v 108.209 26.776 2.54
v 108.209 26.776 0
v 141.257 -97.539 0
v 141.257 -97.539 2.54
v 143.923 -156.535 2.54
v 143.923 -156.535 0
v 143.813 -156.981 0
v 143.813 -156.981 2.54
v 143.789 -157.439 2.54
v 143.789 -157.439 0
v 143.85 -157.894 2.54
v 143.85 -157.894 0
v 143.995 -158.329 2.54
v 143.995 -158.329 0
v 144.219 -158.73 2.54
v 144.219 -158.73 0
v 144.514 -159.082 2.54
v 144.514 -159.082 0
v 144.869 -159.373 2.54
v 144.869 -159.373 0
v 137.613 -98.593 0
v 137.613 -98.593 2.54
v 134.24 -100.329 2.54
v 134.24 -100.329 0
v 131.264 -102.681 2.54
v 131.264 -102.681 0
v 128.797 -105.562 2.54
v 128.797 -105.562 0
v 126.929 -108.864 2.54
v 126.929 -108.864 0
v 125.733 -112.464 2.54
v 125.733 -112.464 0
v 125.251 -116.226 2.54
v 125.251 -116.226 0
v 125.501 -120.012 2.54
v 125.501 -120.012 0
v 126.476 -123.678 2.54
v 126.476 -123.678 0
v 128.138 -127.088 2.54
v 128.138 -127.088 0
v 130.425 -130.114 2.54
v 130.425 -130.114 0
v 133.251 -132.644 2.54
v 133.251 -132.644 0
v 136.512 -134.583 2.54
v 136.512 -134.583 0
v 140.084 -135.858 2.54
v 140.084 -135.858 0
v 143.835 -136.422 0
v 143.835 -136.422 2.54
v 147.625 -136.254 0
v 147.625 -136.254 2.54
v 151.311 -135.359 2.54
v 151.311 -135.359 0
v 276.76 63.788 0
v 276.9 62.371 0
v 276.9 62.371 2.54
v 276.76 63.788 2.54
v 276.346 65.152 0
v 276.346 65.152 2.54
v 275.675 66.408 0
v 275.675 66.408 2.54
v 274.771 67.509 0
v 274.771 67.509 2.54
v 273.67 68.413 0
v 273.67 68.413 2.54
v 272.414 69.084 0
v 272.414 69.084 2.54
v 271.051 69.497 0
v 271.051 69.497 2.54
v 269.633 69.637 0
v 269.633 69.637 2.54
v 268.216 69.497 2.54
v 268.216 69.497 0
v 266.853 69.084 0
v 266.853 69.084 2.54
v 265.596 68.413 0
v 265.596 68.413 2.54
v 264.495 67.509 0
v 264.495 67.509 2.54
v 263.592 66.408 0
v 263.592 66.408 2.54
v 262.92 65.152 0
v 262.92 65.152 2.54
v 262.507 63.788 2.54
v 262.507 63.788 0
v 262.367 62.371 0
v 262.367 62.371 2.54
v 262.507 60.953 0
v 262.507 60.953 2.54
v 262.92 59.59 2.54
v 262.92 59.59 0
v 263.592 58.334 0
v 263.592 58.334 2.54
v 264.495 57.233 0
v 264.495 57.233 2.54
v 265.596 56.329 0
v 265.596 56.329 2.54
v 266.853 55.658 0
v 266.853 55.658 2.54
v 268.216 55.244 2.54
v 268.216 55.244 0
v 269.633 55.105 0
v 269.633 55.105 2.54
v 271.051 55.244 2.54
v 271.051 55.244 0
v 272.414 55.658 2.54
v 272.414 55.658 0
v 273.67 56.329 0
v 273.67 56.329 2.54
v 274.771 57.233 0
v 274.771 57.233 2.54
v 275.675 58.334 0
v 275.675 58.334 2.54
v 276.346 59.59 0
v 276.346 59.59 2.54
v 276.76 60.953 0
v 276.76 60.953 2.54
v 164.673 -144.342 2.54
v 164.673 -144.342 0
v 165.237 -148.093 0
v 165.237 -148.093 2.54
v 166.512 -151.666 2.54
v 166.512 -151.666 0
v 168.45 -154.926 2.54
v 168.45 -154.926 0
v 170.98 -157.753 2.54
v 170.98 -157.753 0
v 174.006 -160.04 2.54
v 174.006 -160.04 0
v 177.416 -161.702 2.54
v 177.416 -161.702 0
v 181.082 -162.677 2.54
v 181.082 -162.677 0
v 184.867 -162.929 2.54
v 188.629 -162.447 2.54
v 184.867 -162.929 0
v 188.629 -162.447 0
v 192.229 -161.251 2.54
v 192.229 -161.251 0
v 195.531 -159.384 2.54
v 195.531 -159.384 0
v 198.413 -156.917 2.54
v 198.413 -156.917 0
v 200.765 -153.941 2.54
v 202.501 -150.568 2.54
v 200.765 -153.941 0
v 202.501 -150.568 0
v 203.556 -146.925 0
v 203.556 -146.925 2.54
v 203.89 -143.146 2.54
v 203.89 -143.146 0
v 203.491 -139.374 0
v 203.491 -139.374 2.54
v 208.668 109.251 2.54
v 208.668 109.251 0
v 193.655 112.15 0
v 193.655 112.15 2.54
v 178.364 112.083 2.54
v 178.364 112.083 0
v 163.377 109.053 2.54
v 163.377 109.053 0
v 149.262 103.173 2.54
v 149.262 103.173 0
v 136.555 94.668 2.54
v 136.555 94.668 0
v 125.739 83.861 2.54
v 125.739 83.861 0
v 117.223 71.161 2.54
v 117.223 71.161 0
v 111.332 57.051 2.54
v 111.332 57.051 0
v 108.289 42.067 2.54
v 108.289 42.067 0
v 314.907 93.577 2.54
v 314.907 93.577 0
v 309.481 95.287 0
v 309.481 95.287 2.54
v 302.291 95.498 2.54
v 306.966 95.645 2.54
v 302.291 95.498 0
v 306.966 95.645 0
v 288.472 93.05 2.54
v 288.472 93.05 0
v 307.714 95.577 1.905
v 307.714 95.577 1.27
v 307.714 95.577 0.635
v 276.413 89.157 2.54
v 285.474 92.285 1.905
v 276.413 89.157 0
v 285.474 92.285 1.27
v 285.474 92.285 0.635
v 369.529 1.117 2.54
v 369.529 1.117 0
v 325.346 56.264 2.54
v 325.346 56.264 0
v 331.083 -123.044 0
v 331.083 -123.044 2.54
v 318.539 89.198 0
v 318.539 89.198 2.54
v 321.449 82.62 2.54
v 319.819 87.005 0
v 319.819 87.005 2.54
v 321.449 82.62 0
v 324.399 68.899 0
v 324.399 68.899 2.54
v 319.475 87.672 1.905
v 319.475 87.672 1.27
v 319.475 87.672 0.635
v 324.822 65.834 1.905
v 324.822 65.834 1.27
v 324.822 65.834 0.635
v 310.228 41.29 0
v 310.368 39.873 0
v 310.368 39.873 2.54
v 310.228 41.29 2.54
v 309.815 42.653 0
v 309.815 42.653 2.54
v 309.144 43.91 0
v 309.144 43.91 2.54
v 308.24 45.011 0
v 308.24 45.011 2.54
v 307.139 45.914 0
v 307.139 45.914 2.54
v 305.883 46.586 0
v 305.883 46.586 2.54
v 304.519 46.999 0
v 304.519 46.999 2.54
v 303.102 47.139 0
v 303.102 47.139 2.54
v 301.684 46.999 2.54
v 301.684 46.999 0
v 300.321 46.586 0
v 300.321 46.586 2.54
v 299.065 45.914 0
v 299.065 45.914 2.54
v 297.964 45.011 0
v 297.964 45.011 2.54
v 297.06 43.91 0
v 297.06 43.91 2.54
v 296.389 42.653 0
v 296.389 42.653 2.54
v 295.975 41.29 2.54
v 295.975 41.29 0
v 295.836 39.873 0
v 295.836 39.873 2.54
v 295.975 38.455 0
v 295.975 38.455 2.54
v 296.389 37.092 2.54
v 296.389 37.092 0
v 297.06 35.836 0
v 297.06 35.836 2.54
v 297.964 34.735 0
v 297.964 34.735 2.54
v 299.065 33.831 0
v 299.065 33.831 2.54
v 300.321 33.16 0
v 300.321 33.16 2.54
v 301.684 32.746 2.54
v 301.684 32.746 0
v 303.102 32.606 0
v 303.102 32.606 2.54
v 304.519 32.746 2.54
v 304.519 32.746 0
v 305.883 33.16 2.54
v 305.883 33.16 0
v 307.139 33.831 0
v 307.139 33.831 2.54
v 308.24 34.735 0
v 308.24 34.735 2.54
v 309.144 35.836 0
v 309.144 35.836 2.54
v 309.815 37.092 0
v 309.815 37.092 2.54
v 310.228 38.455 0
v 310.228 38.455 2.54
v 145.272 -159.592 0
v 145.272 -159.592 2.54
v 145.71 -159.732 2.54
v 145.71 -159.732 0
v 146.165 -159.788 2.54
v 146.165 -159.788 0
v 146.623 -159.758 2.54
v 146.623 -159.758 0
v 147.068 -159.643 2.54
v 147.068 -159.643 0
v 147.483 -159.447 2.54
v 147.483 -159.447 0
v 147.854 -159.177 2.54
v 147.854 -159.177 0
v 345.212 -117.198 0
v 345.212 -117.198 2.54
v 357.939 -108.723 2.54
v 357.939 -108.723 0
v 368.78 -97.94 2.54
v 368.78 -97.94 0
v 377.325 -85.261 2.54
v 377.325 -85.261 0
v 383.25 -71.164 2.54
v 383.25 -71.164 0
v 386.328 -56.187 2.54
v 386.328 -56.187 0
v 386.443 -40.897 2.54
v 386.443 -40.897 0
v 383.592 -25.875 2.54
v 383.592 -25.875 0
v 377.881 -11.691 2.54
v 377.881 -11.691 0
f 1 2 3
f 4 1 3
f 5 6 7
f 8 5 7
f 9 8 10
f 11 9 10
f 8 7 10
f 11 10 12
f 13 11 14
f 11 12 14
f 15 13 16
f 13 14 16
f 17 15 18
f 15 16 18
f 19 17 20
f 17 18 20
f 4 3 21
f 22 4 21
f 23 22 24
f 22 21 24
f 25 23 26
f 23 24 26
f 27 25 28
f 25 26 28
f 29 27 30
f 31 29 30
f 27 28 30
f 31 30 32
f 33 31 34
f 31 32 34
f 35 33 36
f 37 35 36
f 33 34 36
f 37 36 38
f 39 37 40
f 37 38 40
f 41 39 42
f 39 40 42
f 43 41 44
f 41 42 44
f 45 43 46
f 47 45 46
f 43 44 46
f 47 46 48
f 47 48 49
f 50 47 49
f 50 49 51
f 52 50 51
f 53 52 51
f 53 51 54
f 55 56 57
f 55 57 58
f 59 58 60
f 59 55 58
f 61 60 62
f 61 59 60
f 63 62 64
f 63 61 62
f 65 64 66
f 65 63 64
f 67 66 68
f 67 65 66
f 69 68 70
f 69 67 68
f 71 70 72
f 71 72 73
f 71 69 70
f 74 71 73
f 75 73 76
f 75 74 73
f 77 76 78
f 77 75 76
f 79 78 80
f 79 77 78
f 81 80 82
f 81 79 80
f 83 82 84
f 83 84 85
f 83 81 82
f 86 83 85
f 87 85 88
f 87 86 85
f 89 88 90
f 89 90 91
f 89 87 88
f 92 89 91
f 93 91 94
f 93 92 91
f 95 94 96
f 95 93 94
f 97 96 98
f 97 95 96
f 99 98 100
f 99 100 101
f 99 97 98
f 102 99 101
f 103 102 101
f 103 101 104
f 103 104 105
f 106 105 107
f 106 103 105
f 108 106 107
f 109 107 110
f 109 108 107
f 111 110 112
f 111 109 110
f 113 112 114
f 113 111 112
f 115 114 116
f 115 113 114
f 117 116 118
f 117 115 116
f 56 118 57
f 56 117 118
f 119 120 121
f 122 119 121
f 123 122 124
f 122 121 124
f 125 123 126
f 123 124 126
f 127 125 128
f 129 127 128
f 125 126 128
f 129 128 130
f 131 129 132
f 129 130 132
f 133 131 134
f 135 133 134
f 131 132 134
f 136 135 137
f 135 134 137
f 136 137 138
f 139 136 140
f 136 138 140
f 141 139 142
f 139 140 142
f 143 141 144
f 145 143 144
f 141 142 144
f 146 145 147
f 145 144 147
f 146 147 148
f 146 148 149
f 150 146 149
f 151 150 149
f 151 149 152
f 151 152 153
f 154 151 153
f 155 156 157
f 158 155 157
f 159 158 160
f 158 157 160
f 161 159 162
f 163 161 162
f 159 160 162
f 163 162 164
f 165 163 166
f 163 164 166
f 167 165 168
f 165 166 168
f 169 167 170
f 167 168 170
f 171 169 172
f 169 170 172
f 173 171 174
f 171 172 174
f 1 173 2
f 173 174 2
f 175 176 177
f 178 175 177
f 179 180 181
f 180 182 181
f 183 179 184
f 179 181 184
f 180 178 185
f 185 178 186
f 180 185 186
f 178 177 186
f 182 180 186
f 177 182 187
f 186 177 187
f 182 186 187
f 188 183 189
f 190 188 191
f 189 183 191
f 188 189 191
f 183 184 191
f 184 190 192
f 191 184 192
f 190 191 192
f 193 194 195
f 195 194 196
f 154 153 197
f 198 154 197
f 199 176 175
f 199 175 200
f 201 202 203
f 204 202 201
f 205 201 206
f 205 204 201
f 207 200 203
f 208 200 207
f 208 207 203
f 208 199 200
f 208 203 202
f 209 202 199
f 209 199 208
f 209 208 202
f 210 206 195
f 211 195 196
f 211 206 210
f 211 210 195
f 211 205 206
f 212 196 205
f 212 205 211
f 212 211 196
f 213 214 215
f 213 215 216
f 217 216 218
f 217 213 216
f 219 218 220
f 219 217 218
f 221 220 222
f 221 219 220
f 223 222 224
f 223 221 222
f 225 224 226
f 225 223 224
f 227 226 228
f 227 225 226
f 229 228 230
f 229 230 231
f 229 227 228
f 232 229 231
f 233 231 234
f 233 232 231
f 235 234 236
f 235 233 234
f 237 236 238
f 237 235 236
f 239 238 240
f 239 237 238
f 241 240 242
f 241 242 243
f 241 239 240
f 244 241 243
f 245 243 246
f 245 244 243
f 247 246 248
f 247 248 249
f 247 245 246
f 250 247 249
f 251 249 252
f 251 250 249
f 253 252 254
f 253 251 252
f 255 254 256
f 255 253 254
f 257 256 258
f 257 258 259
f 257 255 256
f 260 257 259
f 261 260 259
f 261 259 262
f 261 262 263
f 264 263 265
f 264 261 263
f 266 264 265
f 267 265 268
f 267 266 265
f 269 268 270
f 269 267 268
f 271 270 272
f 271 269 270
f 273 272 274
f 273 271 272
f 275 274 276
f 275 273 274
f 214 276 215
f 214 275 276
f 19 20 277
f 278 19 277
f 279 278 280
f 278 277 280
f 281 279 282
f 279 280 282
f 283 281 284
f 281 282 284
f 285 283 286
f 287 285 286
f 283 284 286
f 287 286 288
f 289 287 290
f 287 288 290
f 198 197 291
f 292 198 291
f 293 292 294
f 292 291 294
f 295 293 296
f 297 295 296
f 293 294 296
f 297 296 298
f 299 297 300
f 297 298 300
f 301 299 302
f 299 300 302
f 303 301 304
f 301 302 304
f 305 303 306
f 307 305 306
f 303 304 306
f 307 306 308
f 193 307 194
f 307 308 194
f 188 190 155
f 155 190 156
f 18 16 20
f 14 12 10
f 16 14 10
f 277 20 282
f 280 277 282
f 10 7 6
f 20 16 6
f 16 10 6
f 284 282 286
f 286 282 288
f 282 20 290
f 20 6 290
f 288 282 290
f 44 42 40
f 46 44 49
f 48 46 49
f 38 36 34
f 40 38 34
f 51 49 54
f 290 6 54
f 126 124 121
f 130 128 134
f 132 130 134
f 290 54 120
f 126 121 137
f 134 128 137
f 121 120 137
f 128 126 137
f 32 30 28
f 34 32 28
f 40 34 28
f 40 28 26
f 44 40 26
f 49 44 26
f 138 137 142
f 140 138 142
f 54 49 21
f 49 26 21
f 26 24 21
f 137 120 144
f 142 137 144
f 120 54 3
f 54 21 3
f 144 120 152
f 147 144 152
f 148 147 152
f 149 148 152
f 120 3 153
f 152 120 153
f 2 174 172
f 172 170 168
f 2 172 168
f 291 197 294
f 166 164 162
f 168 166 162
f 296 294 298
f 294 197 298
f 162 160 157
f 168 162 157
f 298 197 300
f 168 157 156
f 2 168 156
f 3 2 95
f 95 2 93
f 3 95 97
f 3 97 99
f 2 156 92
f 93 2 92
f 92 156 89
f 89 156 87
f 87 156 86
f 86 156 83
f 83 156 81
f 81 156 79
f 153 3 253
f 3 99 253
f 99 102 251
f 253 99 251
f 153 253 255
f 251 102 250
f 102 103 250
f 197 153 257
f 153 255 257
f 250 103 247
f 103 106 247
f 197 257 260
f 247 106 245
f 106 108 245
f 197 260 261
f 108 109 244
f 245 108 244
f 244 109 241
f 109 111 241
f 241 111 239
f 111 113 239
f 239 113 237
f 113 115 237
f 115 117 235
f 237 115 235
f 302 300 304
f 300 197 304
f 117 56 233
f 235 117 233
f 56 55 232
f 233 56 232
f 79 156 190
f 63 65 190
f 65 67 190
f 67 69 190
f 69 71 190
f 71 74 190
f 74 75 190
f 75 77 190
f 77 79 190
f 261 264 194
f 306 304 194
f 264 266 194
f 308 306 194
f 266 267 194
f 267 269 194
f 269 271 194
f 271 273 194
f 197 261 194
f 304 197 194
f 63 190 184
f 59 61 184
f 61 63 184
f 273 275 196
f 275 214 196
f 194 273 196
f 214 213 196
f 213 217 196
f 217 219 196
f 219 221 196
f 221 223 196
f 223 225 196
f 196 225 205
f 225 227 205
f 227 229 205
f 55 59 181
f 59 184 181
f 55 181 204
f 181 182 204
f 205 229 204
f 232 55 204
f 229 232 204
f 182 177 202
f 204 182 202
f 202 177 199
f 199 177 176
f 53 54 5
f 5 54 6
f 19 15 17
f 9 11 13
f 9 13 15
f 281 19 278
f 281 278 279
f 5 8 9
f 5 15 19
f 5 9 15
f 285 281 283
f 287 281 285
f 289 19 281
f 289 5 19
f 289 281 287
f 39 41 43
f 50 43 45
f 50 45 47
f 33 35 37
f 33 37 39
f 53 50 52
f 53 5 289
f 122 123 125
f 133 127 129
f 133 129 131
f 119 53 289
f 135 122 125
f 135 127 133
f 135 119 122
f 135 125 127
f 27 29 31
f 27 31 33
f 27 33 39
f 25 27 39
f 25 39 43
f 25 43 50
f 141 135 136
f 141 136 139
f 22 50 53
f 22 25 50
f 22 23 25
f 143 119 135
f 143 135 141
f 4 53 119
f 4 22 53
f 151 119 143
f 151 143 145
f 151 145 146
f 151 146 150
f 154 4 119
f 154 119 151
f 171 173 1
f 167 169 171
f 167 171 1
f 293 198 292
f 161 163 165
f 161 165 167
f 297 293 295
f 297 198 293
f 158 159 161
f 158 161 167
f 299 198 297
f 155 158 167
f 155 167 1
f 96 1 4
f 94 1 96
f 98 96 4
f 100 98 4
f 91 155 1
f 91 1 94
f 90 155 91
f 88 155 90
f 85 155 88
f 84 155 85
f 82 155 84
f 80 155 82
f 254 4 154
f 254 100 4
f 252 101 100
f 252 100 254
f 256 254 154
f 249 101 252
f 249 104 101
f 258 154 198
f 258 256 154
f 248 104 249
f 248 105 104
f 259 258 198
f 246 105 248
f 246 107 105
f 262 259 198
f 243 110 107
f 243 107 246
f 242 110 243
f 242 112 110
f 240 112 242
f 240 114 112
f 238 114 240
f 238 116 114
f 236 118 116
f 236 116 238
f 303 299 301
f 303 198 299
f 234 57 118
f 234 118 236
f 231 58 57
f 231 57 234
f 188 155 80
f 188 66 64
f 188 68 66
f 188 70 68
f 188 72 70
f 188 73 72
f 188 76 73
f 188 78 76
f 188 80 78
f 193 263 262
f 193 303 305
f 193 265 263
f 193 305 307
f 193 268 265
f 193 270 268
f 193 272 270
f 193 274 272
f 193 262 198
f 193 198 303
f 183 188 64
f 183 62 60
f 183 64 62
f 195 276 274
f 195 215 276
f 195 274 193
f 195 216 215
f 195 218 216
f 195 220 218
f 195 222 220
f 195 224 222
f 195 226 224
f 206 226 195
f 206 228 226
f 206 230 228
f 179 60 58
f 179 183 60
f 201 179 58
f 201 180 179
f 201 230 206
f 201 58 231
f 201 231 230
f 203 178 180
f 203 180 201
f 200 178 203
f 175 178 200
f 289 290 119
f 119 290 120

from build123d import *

# Parameters (mm, degrees)
F0_R     = 9.082794509
F1_DEPTH = 3.175
F2_SCALE = 0.8


# Not quite as in the source:
# - a feature names something its author has since deleted; it is built from what else it names


with BuildPart() as f1:
    # F0 (on Top) → F1 (new body)
    with BuildSketch(Plane.XY):
        with BuildLine():
            Line((190.1853488741, -177.0173265019), (349.6757983606, -156.6053567409))
            ThreePointArc((349.6757983606, -156.6053567409), (414.8838780797, -91.7557523294), (397.7330321915, -1.4041428346))
            Line((397.7330321915, -1.4041428346), (342.5045750448, 67.5291355358))
            add(Edge.make_bspline(
                [(329.4549969886, 114.1704269865), (331.5452640948, 111.8836468118), (336.0081220097, 107.0012205554), (339.0892090613, 95.2737066428), (342.2686372384, 79.5699362539), (342.4299296899, 71.3385709799), (342.5045750448, 67.5291355358)],
                knots=[0, 0, 0, 0, 0.2181778066, 0.4658239841, 0.7527859619, 1, 1, 1, 1], degree=3))
            add(Edge.make_bspline(
                [(329.4549969886, 114.1704269865), (326.548311382, 115.2426951096), (320.3423462083, 117.5320581607), (308.3194887471, 115.9577079905), (292.5774945842, 112.9732838027), (284.8943646943, 110.0150910055), (281.3386498949, 108.6460538997)],
                knots=[0, 0, 0, 0, 0.2181778066, 0.4658239841, 0.7527859619, 1, 1, 1, 1], degree=3))
            Line((281.3386498949, 108.6460538997), (196.6563418366, 133.7634989848))
            ThreePointArc((196.6563418366, 133.7634989848), (106.5159411756, 115.5351413614), (71.0829640293, 30.6701368923))
            Line((71.0829640293, 30.6701368923), (112.3931918139, -124.7239333526))
            Line((112.3931918139, -124.7239333526), (124.9610056376, -171.9994834736))
            Line((124.9610056376, -171.9994834736), (128.3971803048, -184.9251243198))
            Line((128.3971803048, -184.9251243198), (141.6635569768, -183.2272616556))
            Line((141.6635569768, -183.2272616556), (190.1853488741, -177.0173265019))
        make_face()
        with Locations((314.69919144, 47.0405749589)):
            Circle(F0_R, mode=Mode.SUBTRACT)
        with Locations((272.863497229, 75.1633380718)):
            Circle(F0_R, mode=Mode.SUBTRACT)
        with BuildLine():
            ThreePointArc((112.3931918139, -124.7239333526), (93.1968044826, -155.1354338039), (124.9610056376, -171.9994834736))
            Line((124.9610056376, -171.9994834736), (112.3931918139, -124.7239333526))
        make_face()
        with BuildLine():
            ThreePointArc((141.6635569768, -183.2272616556), (169.2714467636, -206.2742802869), (190.1853488741, -177.0173265019))
            Line((190.1853488741, -177.0173265019), (141.6635569768, -183.2272616556))
        make_face()
        with BuildLine():
            Line((120.3224166543, -196.9372207683), (128.3971803048, -184.9251243198))
            Line((128.3971803048, -184.9251243198), (124.9610056376, -171.9994834736))
            Line((124.9610056376, -171.9994834736), (115.7260780635, -198.4687475134))
            ThreePointArc((115.7260780635, -198.4687475134), (117.6479584787, -196.5736854806), (120.3224166543, -196.9372207683))
        make_face()
        with BuildLine():
            Line((120.6394586436, -201.7716170066), (141.6635569768, -183.2272616556))
            Line((141.6635569768, -183.2272616556), (128.3971803048, -184.9251243198))
            Line((128.3971803048, -184.9251243198), (120.3224166543, -196.9372207683))
            ThreePointArc((120.3224166543, -196.9372207683), (121.6687259476, -199.2765231696), (120.6394586436, -201.7716170066))
        make_face()
        with BuildLine():
            ThreePointArc((116.9081491924, -202.0163180432), (118.8155291594, -202.53021243), (120.6394586436, -201.7716170066))
            ThreePointArc((120.6394586436, -201.7716170066), (121.6687259476, -199.2765231696), (120.3224166543, -196.9372207683))
            Line((120.3224166543, -196.9372207683), (116.9081491924, -202.0163180432))
        make_face()
        with BuildLine():
            Line((116.9081491924, -202.0163180432), (120.3224166543, -196.9372207683))
            ThreePointArc((120.3224166543, -196.9372207683), (117.6479584787, -196.5736854806), (115.7260780635, -198.4687475134))
            ThreePointArc((115.7260780635, -198.4687475134), (115.7121989982, -200.4440938504), (116.9081491924, -202.0163180432))
        make_face()
    extrude(amount=F1_DEPTH)


with BuildPart() as f1_1:
    # F2: moved
    add(f1.part.scale(F2_SCALE).moved(Location((51.3425254966, 2.2402065434, 0))))


solid = f1_1.part
